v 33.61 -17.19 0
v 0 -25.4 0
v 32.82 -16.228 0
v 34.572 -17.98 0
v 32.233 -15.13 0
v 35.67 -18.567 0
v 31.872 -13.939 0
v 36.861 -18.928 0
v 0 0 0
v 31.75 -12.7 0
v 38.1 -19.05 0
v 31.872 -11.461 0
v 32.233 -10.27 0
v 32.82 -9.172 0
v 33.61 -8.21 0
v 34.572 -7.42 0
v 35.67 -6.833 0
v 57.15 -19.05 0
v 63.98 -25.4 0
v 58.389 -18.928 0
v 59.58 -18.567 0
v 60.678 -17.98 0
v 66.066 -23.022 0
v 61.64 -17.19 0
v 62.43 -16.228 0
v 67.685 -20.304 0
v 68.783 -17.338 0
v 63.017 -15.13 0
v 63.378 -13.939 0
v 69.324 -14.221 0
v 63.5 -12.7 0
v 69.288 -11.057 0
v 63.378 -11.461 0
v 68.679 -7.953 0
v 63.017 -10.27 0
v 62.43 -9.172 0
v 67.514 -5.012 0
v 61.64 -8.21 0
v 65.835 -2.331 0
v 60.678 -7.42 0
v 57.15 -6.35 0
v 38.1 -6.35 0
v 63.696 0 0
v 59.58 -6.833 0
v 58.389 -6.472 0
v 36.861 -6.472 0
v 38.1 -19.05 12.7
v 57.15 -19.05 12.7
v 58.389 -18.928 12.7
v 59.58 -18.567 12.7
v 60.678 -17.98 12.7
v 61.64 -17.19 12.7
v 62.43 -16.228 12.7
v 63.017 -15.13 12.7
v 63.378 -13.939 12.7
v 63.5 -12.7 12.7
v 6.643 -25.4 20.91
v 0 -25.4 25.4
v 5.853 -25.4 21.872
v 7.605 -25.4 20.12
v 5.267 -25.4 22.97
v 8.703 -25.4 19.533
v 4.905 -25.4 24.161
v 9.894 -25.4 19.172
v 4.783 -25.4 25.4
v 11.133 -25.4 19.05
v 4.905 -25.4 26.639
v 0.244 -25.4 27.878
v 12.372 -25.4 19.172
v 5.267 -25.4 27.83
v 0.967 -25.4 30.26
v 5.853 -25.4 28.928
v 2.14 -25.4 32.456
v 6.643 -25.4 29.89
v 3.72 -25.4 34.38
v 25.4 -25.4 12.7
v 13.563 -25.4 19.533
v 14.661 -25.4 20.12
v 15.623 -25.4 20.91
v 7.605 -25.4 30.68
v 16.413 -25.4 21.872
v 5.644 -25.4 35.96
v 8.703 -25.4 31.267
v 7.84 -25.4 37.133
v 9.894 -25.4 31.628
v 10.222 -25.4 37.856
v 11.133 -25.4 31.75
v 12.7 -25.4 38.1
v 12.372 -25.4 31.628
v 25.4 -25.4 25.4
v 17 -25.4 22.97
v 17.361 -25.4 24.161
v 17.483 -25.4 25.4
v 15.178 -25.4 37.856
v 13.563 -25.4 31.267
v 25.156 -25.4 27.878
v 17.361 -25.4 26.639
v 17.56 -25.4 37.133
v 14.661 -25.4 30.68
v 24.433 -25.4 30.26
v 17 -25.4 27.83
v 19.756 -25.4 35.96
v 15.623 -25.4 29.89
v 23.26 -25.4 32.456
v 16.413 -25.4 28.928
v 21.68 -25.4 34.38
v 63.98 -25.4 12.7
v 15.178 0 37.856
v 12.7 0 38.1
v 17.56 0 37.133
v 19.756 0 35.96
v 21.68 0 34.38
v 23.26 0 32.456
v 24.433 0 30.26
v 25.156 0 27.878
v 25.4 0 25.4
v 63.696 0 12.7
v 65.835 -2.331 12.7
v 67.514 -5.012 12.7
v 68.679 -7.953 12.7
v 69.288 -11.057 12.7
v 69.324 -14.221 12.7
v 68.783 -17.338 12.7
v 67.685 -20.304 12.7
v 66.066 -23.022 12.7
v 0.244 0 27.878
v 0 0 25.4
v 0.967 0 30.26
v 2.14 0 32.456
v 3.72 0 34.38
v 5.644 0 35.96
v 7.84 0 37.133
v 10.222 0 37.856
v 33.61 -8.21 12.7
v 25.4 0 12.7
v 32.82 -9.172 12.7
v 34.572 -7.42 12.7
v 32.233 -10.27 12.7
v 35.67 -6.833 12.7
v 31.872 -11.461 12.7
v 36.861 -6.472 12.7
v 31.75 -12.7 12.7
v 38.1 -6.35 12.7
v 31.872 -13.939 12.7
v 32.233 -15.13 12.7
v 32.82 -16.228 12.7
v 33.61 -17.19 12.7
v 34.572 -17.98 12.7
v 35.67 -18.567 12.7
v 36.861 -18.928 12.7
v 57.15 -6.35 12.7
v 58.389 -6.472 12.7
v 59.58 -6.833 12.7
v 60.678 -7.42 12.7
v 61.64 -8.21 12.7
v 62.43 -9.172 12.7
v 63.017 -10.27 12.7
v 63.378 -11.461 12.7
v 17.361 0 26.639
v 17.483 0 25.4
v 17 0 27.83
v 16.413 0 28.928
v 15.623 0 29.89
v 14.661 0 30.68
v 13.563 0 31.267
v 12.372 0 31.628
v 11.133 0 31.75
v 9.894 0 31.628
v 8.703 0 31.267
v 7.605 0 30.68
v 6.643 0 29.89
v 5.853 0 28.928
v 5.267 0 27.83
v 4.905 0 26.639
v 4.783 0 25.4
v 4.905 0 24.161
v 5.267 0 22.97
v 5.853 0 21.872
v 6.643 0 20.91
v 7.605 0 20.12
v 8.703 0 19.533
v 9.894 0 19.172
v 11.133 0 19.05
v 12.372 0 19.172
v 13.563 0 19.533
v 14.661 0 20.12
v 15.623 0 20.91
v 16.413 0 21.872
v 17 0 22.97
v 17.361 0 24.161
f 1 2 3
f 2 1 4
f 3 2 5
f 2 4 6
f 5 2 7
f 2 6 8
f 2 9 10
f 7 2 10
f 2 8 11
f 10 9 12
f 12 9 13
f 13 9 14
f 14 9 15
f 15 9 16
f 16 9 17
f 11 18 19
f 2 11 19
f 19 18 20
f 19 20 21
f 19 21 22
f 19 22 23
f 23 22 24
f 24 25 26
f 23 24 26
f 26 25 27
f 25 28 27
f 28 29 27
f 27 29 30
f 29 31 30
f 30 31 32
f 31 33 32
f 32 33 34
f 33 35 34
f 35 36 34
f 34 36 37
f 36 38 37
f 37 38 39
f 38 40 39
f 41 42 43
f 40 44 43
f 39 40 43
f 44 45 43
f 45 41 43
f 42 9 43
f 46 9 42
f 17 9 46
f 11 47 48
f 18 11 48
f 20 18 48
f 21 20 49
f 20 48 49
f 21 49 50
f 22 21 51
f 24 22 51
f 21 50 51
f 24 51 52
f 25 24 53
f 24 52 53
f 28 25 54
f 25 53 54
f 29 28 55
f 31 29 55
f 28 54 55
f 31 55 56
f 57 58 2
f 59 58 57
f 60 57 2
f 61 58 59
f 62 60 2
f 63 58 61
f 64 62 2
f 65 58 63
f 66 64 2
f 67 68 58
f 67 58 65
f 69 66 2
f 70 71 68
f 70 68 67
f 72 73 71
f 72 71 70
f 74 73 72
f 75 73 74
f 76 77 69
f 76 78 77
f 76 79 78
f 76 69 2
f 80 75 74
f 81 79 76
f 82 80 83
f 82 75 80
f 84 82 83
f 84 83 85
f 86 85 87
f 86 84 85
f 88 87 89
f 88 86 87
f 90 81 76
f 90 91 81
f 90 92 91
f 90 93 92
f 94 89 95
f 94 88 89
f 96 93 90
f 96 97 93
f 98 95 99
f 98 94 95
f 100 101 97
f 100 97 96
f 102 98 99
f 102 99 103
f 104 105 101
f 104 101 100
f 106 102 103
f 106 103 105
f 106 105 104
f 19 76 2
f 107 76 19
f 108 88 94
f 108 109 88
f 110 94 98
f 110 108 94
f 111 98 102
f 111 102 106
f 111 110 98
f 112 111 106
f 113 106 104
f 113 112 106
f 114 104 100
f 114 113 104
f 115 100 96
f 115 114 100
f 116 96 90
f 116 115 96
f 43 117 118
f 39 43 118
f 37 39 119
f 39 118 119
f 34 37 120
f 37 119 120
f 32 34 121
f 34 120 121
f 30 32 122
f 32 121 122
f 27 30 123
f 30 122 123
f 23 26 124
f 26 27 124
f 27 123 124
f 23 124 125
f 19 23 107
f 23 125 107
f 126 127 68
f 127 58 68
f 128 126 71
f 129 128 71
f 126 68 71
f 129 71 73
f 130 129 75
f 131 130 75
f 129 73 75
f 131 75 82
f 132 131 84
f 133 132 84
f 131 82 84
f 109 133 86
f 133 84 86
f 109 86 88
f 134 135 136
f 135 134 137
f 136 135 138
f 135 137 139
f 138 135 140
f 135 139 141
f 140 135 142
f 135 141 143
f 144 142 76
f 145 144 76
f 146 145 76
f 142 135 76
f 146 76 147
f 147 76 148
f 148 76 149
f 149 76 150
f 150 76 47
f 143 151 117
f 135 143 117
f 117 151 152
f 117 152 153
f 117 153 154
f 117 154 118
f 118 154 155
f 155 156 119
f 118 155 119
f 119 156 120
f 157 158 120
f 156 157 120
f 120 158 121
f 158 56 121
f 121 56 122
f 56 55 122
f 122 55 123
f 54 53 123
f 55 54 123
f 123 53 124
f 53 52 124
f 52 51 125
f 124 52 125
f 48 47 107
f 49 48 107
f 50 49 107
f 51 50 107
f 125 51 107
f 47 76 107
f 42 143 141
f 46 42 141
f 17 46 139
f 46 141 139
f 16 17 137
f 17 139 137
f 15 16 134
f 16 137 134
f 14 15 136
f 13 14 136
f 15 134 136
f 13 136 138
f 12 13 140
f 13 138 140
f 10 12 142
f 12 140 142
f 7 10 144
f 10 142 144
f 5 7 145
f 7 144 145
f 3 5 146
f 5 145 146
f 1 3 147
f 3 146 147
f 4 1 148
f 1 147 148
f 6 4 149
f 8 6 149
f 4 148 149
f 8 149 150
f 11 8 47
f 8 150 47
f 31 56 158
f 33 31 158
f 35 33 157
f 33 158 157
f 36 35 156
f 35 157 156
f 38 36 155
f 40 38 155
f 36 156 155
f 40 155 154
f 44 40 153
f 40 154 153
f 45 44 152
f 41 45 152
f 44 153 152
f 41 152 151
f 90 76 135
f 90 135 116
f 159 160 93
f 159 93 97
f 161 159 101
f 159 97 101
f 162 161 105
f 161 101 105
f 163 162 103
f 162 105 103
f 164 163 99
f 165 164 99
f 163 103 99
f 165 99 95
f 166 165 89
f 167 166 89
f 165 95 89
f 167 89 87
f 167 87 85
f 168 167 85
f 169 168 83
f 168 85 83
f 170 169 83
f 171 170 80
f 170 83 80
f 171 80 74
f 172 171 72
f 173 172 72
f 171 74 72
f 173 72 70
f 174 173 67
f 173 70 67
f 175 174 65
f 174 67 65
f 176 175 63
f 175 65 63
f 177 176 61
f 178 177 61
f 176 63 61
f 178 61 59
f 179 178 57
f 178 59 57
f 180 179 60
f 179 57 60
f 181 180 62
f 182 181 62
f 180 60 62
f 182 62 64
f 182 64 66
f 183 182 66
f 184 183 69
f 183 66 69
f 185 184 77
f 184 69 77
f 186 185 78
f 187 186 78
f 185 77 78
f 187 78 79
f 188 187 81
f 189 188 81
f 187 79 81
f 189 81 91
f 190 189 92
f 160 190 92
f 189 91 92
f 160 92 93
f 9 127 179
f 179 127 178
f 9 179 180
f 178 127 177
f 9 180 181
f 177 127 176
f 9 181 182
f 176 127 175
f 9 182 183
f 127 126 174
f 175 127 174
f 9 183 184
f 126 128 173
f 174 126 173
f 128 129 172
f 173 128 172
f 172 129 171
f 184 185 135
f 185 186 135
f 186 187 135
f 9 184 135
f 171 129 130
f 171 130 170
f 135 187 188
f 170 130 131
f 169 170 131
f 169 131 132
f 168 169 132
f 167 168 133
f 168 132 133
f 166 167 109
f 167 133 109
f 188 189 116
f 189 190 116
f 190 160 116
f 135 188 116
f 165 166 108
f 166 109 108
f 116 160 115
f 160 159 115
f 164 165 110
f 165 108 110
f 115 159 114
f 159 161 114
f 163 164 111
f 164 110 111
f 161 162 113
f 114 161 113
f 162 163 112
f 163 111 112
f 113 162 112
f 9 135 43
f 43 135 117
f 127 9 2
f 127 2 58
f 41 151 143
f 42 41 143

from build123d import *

# Parameters (mm, degrees)
F0_W      = 69.85
F0_H      = 38.1
F1_DEPTH  = 25.4
F2_W      = 44.45
F2_H      = 25.4
F3_DEPTH  = 25.4
F4_R      = 12.69999
F5_R      = 6.35
F6_DEPTH  = 25.4
F8_DEPTH  = 50.8
F10_DEPTH = 50.8


# Not quite as in the source:
# - a fillet or chamfer is up to 0.001 mm smaller than in the source, because OpenCascade refuses the exact size


with BuildPart() as f1:
    # F0 (on Front) → F1 (new body)
    with BuildSketch(Plane.XZ):
        with Locations((34.925, 19.05)):
            Rectangle(F0_W, F0_H)
    extrude(amount=F1_DEPTH)

    # F2 (on face) → F3 (cut)
    with BuildSketch(Plane.XZ.offset(25.4)):
        with Locations((47.625, 25.4)):
            Rectangle(F2_W, F2_H)
    extrude(amount=-F3_DEPTH, mode=Mode.SUBTRACT)

    # F4 (radius 12.7 in the source; OpenCascade refuses exactly that, so slightly less here)
    f4_edges = [f1.edges().sort_by_distance(p)[0] for p in [
        (25.4, -12.7, 38.1),
        (0, -12.7, 38.1),
    ]]
    fillet(f4_edges, radius=F4_R)

    # F5 (on face) → F6 (cut)
    with BuildSketch(Plane.XZ.offset(25.4)):
        with Locations((11.1332936212, 25.4)):
            Circle(F5_R)
    extrude(amount=-F6_DEPTH, mode=Mode.SUBTRACT)

    # F7 (on face) → F8 (cut)
    with BuildSketch(Plane.XY.offset(12.7)):
        with BuildLine():
            ThreePointArc((38.1, -19.05), (42.5901280605, -17.1901280605), (44.45, -12.7))
            ThreePointArc((44.45, -12.7), (42.5901280605, -8.2098719395), (38.1, -6.35))
            ThreePointArc((38.1, -6.35), (31.75, -12.7), (38.1, -19.05))
        make_face()
        with BuildLine():
            ThreePointArc((38.1, -6.35), (42.5901280605, -8.2098719395), (44.45, -12.7))
            ThreePointArc((44.45, -12.7), (42.5901280605, -17.1901280605), (38.1, -19.05))
            Line((38.1, -19.05), (57.15, -19.05))
            ThreePointArc((57.15, -19.05), (50.8, -12.7), (57.15, -6.35))
            Line((57.15, -6.35), (38.1, -6.35))
        make_face()
        with BuildLine():
            ThreePointArc((63.5, -12.7), (61.6401280605, -8.2098719395), (57.15, -6.35))
            ThreePointArc((57.15, -6.35), (50.8, -12.7), (57.15, -19.05))
            ThreePointArc((57.15, -19.05), (61.6401280605, -17.1901280605), (63.5, -12.7))
        make_face()
    extrude(amount=-F8_DEPTH, mode=Mode.SUBTRACT)

    # F9 (on face) → F10 (cut)
    with BuildSketch(Plane.XY.offset(12.7)):
        with BuildLine():
            ThreePointArc((63.6959075928, 0), (69.3784721841, -12.6381087117), (63.9796331525, -25.4))
            Line((63.9796331525, -25.4), (69.85, -25.4))
            Line((69.85, -25.4), (69.85, 0))
            Line((69.85, 0), (63.6959075928, 0))
        make_face()
    extrude(amount=-F10_DEPTH, mode=Mode.SUBTRACT)


solid = f1.part
